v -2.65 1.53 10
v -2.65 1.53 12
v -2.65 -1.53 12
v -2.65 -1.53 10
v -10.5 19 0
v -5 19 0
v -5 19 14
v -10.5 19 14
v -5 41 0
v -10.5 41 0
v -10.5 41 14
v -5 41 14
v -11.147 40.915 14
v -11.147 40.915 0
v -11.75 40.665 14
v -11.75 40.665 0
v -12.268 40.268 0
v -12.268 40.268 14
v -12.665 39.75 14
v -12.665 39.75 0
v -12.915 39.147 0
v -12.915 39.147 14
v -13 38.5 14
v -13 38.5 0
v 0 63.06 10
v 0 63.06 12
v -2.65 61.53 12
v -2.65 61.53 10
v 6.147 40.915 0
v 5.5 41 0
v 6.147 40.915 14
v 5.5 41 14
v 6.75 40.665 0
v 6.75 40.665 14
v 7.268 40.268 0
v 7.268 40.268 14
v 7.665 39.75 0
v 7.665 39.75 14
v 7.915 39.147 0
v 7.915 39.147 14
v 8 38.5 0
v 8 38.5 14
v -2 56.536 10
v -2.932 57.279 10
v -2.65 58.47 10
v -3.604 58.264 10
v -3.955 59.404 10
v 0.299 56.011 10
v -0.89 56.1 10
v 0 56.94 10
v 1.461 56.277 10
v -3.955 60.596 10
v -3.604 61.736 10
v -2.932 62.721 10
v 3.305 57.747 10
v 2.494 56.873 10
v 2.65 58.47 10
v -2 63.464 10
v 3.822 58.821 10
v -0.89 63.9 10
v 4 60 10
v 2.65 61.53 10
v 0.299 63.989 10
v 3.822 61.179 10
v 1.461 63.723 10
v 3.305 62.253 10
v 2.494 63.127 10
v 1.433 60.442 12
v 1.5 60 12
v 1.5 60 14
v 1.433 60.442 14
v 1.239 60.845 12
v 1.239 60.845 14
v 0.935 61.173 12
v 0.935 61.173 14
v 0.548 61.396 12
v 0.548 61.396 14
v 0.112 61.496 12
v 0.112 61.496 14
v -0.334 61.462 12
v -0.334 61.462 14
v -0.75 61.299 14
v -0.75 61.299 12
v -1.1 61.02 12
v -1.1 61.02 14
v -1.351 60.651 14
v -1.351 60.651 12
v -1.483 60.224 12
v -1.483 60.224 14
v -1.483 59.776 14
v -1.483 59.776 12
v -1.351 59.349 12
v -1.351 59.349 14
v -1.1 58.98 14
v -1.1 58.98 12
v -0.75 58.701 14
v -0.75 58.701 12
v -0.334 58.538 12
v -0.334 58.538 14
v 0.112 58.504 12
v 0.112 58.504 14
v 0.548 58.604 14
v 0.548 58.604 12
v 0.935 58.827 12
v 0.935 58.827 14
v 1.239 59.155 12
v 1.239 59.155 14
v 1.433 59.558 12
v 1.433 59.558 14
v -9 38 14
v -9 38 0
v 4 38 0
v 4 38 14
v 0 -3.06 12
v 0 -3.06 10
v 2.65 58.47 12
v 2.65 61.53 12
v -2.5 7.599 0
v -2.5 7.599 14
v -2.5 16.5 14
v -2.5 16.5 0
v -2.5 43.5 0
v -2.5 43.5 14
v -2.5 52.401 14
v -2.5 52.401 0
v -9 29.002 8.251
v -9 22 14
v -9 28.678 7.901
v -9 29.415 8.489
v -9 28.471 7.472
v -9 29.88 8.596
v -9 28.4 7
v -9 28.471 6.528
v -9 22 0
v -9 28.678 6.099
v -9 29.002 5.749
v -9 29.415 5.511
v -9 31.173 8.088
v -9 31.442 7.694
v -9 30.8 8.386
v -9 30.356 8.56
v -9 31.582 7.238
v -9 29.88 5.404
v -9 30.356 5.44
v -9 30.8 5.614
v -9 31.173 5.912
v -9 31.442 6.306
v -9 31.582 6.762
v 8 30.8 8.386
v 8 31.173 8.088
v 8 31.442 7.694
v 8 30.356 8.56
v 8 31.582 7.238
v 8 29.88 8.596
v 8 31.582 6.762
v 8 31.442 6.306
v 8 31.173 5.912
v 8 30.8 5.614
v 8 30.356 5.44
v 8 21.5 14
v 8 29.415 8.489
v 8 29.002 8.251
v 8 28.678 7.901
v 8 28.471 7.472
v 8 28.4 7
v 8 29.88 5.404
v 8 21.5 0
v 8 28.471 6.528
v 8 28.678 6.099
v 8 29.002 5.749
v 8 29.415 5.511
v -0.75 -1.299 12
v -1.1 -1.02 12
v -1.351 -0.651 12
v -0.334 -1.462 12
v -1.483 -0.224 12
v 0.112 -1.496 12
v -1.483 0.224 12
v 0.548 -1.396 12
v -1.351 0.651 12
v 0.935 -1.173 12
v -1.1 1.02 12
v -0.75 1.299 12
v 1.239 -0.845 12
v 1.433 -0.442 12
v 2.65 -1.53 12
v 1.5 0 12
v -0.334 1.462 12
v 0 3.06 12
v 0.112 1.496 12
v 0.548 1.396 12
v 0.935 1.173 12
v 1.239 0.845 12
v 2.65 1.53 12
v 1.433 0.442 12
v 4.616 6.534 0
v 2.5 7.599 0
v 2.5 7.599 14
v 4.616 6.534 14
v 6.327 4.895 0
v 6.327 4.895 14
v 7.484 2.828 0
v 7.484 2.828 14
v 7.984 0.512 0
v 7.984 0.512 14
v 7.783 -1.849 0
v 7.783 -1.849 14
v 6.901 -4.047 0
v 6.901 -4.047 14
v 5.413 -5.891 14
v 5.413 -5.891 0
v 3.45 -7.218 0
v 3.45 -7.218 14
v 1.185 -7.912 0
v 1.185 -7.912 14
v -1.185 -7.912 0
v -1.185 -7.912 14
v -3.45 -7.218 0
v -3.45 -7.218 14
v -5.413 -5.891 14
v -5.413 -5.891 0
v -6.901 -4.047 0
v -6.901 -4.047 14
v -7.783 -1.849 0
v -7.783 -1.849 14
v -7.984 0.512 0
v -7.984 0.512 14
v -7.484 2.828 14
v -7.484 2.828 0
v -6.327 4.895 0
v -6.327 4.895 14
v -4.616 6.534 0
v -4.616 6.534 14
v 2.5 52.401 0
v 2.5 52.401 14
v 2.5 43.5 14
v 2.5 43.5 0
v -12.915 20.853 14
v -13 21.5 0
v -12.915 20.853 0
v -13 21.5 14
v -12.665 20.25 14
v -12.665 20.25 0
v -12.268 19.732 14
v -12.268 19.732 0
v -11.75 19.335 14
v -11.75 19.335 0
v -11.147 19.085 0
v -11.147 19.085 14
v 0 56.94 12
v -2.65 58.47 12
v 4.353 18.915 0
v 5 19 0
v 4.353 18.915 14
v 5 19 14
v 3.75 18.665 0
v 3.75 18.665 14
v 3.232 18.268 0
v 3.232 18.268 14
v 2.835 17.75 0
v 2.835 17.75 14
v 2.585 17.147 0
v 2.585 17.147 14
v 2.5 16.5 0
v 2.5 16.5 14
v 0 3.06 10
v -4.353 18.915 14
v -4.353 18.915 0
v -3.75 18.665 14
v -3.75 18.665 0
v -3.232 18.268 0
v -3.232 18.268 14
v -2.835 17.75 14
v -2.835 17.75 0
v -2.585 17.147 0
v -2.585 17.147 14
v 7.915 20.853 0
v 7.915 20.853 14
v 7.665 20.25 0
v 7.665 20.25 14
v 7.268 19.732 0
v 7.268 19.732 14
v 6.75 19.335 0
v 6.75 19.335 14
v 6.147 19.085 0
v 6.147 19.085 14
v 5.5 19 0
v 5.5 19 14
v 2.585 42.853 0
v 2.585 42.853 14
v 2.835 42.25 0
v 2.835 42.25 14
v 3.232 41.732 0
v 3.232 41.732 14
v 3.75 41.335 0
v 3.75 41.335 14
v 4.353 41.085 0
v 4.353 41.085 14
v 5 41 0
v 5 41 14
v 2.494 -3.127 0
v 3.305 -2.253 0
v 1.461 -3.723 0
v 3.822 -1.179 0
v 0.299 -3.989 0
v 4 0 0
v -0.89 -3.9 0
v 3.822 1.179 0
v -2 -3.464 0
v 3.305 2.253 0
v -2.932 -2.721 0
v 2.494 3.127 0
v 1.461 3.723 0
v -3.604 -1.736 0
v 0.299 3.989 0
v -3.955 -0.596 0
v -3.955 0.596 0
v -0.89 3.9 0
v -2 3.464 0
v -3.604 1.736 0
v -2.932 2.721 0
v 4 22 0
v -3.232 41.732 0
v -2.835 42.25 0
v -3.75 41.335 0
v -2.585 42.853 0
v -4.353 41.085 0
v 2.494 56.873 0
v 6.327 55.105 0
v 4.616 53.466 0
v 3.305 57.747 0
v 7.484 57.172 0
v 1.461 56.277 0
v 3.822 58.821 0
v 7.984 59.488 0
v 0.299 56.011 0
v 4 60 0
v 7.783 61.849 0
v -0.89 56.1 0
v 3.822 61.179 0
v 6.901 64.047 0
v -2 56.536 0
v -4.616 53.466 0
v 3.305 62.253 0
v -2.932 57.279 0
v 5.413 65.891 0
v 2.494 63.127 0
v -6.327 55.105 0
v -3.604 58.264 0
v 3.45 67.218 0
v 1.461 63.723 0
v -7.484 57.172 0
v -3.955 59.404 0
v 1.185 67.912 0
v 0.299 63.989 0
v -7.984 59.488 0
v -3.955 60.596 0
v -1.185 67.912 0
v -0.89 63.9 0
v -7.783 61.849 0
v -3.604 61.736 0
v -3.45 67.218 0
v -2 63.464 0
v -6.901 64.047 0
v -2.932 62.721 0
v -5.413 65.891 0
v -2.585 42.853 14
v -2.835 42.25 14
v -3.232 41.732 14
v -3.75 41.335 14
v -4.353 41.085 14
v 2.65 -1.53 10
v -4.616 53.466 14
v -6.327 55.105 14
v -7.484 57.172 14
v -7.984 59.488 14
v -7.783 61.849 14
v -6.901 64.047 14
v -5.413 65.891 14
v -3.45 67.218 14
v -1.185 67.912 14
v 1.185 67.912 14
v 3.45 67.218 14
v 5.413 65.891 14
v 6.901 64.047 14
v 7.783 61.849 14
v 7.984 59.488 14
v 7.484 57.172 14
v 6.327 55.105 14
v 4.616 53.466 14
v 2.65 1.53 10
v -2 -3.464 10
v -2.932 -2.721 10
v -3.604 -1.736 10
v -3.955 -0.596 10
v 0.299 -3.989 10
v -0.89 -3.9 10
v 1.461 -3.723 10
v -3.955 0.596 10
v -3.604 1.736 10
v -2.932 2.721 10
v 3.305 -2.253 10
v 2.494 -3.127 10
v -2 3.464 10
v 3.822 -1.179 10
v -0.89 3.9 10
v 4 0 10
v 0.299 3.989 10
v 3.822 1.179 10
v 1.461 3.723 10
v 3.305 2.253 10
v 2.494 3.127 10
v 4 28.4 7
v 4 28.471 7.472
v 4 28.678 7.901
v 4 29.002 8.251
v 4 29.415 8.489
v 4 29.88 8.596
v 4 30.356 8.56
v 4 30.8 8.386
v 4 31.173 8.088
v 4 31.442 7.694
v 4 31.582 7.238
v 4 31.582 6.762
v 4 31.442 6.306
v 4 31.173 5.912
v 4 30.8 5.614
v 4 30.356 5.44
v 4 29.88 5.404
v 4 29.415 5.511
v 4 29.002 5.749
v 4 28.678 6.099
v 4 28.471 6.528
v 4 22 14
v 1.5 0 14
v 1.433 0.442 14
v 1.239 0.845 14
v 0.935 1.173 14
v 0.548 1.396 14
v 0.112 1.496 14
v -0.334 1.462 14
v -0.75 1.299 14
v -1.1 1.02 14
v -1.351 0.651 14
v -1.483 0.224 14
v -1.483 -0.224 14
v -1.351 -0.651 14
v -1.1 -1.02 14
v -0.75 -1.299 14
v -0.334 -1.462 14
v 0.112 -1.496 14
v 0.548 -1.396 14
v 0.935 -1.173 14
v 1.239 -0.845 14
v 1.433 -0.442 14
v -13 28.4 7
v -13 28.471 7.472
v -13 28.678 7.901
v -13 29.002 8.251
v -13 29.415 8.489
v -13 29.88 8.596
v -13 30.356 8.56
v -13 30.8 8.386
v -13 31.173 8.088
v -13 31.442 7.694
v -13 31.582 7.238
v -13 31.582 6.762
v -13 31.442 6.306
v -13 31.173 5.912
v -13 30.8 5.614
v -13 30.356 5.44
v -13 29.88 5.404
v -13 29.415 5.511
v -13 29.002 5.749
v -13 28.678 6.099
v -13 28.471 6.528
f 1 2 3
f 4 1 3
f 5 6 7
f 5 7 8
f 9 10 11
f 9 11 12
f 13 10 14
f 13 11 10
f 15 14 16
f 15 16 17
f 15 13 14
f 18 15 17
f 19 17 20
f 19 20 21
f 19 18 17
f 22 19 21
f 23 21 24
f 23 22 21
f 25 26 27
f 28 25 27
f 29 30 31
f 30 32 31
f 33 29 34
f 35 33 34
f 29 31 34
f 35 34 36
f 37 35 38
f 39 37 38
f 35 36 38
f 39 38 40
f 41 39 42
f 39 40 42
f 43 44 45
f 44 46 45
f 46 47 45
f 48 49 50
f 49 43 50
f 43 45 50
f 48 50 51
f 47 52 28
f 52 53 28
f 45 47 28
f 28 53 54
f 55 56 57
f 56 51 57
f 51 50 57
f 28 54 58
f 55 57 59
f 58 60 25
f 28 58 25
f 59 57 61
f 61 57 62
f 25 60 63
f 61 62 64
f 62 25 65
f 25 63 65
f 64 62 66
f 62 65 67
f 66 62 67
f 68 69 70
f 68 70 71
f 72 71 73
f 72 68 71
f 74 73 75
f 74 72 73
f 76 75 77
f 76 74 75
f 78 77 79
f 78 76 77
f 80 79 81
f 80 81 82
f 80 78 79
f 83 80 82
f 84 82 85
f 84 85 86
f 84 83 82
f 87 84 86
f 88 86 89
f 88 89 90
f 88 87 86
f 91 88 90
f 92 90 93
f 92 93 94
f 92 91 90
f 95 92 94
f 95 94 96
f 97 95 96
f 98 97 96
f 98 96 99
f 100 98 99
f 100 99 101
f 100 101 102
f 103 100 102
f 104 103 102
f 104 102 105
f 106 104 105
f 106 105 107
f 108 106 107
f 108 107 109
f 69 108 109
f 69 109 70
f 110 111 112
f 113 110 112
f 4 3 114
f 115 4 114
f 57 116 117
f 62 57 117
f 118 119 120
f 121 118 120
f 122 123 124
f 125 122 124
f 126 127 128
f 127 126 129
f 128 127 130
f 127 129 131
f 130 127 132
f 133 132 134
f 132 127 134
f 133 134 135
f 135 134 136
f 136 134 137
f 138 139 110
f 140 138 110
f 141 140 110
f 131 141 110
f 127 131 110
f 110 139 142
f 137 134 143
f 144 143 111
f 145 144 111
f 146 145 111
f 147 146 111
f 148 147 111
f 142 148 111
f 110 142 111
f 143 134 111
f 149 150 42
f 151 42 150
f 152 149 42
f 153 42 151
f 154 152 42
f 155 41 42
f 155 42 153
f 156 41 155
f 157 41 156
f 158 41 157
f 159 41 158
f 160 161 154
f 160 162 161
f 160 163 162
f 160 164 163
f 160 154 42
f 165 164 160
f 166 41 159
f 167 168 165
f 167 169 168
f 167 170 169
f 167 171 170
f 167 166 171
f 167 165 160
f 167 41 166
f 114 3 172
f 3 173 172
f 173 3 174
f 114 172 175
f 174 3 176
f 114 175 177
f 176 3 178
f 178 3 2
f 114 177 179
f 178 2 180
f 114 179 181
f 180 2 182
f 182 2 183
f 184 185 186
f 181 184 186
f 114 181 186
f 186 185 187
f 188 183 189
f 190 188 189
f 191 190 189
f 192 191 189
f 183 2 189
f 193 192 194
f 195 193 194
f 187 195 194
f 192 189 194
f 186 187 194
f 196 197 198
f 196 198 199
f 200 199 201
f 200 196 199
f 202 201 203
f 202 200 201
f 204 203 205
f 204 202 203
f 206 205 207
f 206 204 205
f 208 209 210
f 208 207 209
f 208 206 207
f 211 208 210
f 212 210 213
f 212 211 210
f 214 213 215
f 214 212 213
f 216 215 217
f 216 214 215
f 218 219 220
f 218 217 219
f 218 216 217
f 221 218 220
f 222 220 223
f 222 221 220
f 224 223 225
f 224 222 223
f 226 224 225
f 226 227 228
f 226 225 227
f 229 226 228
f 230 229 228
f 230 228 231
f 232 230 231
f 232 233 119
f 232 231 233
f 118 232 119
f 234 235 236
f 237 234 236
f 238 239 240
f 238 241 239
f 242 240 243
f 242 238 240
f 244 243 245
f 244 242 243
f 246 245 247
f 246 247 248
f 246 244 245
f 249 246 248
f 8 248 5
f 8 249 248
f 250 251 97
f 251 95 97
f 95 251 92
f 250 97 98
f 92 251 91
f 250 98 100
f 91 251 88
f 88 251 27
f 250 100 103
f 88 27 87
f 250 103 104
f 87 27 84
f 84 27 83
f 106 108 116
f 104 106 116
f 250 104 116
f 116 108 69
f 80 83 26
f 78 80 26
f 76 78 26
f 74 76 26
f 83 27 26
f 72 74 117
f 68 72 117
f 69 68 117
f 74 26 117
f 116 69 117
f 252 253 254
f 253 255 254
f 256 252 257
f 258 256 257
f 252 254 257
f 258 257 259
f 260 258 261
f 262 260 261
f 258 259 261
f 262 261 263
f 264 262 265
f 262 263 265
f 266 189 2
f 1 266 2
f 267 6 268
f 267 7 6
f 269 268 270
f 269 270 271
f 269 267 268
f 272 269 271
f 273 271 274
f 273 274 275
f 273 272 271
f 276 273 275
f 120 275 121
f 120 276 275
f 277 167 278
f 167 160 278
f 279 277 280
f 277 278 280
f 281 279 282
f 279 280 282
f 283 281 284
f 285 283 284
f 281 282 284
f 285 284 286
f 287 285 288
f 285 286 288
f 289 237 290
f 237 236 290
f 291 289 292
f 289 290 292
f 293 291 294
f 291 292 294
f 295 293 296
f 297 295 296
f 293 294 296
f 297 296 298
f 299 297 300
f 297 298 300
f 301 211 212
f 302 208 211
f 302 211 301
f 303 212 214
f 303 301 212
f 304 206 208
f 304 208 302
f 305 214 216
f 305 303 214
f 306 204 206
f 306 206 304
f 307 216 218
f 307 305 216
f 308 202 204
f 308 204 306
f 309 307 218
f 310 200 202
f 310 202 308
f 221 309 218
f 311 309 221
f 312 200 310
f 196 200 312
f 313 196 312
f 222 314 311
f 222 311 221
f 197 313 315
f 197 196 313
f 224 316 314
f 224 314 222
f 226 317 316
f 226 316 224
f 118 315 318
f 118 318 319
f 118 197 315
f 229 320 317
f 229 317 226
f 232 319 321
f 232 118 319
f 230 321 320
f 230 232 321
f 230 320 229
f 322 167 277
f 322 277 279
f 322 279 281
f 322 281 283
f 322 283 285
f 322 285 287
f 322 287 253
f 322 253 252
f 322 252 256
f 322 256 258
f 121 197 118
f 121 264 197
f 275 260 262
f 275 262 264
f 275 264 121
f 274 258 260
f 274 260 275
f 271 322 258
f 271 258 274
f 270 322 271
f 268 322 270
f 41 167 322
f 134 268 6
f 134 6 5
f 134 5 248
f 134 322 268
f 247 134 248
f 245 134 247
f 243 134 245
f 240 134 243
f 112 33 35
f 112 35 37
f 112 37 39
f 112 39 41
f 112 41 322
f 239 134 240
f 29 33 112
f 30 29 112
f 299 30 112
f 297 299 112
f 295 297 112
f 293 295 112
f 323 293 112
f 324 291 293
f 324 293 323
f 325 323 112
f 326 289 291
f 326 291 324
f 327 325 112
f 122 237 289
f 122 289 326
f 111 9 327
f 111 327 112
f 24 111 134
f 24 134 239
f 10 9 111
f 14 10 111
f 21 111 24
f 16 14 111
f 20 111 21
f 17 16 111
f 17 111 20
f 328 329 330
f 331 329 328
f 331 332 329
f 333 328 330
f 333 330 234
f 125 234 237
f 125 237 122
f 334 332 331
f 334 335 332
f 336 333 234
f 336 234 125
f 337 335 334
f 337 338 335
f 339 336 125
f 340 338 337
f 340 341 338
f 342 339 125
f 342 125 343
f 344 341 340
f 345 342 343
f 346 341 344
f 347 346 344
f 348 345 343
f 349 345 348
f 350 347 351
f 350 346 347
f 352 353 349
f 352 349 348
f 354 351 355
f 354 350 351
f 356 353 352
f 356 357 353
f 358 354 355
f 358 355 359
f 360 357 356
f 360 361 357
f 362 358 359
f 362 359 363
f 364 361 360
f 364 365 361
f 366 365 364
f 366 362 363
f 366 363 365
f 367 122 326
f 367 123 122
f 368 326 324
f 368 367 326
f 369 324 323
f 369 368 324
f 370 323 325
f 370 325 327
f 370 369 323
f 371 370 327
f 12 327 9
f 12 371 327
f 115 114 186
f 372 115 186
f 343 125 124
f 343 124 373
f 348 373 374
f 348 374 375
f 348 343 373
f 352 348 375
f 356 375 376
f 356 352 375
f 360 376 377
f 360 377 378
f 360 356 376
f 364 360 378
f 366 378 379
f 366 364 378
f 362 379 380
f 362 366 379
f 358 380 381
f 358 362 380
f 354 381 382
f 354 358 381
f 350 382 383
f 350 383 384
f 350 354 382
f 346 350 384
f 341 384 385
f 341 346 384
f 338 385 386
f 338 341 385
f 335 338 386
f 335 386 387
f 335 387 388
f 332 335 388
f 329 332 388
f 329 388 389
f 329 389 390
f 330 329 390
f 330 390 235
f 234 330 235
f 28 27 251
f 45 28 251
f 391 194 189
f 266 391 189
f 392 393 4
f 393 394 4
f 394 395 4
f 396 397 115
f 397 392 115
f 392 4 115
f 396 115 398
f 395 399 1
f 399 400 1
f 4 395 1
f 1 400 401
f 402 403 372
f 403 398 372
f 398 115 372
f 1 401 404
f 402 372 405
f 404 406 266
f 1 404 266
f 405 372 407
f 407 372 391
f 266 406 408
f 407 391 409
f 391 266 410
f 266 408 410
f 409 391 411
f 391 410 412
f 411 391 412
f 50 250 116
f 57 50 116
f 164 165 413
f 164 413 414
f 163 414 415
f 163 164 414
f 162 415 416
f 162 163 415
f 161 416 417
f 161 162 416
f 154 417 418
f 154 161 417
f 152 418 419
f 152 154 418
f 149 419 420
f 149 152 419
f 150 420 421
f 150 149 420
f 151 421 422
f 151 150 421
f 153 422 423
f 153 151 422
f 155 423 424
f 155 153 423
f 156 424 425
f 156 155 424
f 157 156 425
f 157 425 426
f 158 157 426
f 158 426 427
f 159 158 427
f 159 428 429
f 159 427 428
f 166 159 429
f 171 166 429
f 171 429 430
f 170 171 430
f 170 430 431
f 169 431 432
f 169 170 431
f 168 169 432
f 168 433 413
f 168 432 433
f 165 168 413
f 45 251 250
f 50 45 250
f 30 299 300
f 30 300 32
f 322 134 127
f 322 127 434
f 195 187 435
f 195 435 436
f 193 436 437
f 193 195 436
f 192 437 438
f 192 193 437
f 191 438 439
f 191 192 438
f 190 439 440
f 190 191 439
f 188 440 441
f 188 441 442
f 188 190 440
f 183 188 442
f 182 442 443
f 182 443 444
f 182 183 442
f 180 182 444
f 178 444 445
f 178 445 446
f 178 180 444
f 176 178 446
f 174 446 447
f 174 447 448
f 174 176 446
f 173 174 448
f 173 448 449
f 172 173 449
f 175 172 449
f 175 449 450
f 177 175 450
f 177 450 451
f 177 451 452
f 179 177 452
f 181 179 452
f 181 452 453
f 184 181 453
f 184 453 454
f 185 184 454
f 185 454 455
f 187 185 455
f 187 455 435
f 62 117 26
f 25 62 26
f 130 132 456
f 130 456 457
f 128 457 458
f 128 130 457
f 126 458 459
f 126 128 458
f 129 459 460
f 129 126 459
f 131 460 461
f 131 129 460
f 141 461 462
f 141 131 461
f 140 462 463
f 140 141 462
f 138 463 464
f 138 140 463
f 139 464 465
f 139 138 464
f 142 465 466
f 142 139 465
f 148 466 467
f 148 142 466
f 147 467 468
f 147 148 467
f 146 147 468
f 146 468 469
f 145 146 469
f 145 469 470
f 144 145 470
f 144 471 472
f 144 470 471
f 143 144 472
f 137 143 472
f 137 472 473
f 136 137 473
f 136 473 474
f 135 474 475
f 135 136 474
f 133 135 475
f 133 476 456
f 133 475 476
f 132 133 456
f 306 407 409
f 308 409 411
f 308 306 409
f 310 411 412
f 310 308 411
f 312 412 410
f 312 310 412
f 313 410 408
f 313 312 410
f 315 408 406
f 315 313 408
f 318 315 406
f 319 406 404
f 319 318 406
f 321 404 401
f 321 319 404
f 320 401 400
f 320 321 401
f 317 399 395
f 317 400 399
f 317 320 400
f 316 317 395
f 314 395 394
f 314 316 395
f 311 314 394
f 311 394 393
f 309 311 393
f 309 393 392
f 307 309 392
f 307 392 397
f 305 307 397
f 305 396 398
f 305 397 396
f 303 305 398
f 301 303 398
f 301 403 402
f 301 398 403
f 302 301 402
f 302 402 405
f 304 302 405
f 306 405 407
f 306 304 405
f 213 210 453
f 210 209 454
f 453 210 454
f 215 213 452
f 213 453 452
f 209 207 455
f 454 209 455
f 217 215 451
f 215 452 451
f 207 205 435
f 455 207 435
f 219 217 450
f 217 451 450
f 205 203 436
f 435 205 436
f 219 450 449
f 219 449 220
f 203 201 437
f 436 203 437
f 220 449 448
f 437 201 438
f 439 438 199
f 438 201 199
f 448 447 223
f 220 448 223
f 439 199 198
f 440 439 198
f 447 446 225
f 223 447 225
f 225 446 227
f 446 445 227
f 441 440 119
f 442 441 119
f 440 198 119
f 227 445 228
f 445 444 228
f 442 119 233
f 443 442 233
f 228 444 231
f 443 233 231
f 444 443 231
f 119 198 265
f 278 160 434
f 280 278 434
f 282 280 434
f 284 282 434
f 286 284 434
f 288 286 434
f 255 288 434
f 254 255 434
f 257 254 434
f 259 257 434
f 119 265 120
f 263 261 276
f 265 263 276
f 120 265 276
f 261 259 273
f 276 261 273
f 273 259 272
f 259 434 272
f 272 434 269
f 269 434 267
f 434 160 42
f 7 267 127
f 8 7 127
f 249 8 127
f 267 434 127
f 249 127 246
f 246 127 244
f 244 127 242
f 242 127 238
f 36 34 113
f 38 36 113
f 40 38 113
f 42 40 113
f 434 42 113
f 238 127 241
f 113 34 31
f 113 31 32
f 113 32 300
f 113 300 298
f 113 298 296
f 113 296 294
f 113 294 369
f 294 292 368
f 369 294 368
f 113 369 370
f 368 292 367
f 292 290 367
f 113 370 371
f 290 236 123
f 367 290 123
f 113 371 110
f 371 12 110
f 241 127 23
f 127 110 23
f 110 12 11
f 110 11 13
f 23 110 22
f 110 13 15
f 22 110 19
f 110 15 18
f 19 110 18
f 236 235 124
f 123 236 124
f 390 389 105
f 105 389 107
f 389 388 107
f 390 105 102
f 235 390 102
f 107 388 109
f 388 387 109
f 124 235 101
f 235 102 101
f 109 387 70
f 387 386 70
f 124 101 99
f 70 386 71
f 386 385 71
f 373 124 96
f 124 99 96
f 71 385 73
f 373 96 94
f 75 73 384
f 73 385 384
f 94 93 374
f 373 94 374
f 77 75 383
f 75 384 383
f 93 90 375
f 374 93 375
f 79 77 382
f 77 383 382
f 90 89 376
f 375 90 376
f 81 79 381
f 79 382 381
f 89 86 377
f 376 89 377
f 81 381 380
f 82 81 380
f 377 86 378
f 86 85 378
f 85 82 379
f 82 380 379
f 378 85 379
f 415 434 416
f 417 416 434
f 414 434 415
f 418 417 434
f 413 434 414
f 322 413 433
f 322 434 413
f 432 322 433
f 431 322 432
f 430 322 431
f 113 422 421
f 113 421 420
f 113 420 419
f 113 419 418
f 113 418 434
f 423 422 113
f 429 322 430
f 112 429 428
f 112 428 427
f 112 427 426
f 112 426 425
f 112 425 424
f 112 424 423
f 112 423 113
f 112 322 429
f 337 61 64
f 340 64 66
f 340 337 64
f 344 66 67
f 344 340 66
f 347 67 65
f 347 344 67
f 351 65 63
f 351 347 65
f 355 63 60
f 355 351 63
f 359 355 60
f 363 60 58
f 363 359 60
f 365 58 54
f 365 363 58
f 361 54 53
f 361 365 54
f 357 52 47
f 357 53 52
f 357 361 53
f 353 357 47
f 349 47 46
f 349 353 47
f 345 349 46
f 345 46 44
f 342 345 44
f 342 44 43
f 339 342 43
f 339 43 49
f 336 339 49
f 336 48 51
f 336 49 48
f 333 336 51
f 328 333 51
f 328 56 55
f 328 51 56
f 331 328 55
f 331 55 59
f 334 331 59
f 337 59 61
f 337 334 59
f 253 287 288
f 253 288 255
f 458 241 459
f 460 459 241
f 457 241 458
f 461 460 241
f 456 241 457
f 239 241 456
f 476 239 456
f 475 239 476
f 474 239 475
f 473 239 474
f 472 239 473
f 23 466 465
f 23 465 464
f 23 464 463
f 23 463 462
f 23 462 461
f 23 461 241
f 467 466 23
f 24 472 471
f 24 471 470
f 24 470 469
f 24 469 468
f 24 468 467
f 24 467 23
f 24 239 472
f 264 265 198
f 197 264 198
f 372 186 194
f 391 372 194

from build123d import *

# Parameters (mm, degrees)
ESBO_O1_R                  = 4
ESBO_O1_W                  = 13
ESBO_O1_H                  = 16
RESSALTO_EXTRUS_O1_DEPTH   = 14
RESSALTO_EXTRUS_O2_START   = -4
ESBO_O3_R                  = 8
ESBO_O3_R_2                = 1.5
RESSALTO_EXTRUS_O2_DEPTH   = 4
CORTE_EXTRUS_O1_DEPTH      = 71.215738976
CORTE_EXTRUS_O1_DEPTH_BACK = 71.215738976
ESBO_O2_R                  = 1.6
CORTE_EXTRUS_O2_START      = 2
CORTE_EXTRUS_O2_DEPTH      = 2
FILETE1_R                  = 2.5


with BuildPart() as part:
    # Esboço1 → Ressalto-extrusão1 (new body)
    with BuildSketch(Plane.XY):
        with BuildLine():
            Line((2.5, 52.400657923), (2.5, 41))
            Line((2.5, 41), (8, 41))
            Line((8, 41), (8, 19))
            Line((8, 19), (2.5, 19))
            Line((2.5, 19), (2.5, 7.599342077))
            ThreePointArc((2.5, 7.599342077), (0, -8), (-2.5, 7.599342077))
            Line((-2.5, 7.599342077), (-2.5, 19))
            Line((-2.5, 19), (-13, 19))
            Line((-13, 19), (-13, 41))
            Line((-13, 41), (-2.5, 41))
            Line((-2.5, 41), (-2.5, 52.400657923))
            ThreePointArc((-2.5, 52.400657923), (0, 68), (2.5, 52.400657923))
        make_face()
        with Locations((0, 60)):
            Circle(ESBO_O1_R, mode=Mode.SUBTRACT)
        Circle(ESBO_O1_R, mode=Mode.SUBTRACT)
        with Locations((-2.5, 30)):
            Rectangle(ESBO_O1_W, ESBO_O1_H, mode=Mode.SUBTRACT)
    extrude(amount=RESSALTO_EXTRUS_O1_DEPTH)

    # Esboço3 → Ressalto-extrusão2 (add)
    # profile 1 of 2: a face of its own
    with BuildSketch(Plane.XY.offset(14).offset(RESSALTO_EXTRUS_O2_START)):
        with Locations((0, 60)):
            Circle(ESBO_O3_R)
        with Locations((0, 60)):
            Circle(ESBO_O3_R_2, mode=Mode.SUBTRACT)
    # profile 2 of 2: a face of its own
    with BuildSketch(Plane.XY.offset(14).offset(RESSALTO_EXTRUS_O2_START)):
        Circle(ESBO_O3_R)
        Circle(ESBO_O3_R_2, mode=Mode.SUBTRACT)
    extrude(amount=RESSALTO_EXTRUS_O2_DEPTH)

    # Esboço2 → Corte-extrusão1 (cut, two sides: drawn at the far end of the back side and taken through both)
    with BuildSketch(Plane.ZY.offset(2.5).offset(-CORTE_EXTRUS_O1_DEPTH_BACK)):
        with Locations(Location((7, 30, 0), (0, 0, 270))):
            Circle(ESBO_O2_R)
    extrude(amount=CORTE_EXTRUS_O1_DEPTH + CORTE_EXTRUS_O1_DEPTH_BACK, mode=Mode.SUBTRACT)

    # Esboço4 → Corte-extrusão2 (cut)
    with BuildSketch(Plane.XY.offset(10).offset(CORTE_EXTRUS_O2_START)):
        Polygon((0, 56.940043573), (2.65, 58.470021787), (2.65, 61.529978213), (0, 63.059956427), (-2.65, 61.529978213), (-2.65, 58.470021787), align=None)
        Polygon((0, -3.059956427), (2.65, -1.529978213), (2.65, 1.529978213), (0, 3.059956427), (-2.65, 1.529978213), (-2.65, -1.529978213), align=None)
    extrude(amount=-CORTE_EXTRUS_O2_DEPTH, mode=Mode.SUBTRACT)

    # Filete1
    filete1_edges = [part.edges().sort_by_distance(p)[0] for p in [
        (-2.5, 19, 7),
        (-13, 19, 7),
        (-13, 41, 7),
        (-2.5, 41, 7),
        (2.5, 41, 7),
        (8, 41, 7),
        (8, 19, 7),
        (2.5, 19, 7),
    ]]
    fillet(filete1_edges, radius=FILETE1_R)


solid = part.part
